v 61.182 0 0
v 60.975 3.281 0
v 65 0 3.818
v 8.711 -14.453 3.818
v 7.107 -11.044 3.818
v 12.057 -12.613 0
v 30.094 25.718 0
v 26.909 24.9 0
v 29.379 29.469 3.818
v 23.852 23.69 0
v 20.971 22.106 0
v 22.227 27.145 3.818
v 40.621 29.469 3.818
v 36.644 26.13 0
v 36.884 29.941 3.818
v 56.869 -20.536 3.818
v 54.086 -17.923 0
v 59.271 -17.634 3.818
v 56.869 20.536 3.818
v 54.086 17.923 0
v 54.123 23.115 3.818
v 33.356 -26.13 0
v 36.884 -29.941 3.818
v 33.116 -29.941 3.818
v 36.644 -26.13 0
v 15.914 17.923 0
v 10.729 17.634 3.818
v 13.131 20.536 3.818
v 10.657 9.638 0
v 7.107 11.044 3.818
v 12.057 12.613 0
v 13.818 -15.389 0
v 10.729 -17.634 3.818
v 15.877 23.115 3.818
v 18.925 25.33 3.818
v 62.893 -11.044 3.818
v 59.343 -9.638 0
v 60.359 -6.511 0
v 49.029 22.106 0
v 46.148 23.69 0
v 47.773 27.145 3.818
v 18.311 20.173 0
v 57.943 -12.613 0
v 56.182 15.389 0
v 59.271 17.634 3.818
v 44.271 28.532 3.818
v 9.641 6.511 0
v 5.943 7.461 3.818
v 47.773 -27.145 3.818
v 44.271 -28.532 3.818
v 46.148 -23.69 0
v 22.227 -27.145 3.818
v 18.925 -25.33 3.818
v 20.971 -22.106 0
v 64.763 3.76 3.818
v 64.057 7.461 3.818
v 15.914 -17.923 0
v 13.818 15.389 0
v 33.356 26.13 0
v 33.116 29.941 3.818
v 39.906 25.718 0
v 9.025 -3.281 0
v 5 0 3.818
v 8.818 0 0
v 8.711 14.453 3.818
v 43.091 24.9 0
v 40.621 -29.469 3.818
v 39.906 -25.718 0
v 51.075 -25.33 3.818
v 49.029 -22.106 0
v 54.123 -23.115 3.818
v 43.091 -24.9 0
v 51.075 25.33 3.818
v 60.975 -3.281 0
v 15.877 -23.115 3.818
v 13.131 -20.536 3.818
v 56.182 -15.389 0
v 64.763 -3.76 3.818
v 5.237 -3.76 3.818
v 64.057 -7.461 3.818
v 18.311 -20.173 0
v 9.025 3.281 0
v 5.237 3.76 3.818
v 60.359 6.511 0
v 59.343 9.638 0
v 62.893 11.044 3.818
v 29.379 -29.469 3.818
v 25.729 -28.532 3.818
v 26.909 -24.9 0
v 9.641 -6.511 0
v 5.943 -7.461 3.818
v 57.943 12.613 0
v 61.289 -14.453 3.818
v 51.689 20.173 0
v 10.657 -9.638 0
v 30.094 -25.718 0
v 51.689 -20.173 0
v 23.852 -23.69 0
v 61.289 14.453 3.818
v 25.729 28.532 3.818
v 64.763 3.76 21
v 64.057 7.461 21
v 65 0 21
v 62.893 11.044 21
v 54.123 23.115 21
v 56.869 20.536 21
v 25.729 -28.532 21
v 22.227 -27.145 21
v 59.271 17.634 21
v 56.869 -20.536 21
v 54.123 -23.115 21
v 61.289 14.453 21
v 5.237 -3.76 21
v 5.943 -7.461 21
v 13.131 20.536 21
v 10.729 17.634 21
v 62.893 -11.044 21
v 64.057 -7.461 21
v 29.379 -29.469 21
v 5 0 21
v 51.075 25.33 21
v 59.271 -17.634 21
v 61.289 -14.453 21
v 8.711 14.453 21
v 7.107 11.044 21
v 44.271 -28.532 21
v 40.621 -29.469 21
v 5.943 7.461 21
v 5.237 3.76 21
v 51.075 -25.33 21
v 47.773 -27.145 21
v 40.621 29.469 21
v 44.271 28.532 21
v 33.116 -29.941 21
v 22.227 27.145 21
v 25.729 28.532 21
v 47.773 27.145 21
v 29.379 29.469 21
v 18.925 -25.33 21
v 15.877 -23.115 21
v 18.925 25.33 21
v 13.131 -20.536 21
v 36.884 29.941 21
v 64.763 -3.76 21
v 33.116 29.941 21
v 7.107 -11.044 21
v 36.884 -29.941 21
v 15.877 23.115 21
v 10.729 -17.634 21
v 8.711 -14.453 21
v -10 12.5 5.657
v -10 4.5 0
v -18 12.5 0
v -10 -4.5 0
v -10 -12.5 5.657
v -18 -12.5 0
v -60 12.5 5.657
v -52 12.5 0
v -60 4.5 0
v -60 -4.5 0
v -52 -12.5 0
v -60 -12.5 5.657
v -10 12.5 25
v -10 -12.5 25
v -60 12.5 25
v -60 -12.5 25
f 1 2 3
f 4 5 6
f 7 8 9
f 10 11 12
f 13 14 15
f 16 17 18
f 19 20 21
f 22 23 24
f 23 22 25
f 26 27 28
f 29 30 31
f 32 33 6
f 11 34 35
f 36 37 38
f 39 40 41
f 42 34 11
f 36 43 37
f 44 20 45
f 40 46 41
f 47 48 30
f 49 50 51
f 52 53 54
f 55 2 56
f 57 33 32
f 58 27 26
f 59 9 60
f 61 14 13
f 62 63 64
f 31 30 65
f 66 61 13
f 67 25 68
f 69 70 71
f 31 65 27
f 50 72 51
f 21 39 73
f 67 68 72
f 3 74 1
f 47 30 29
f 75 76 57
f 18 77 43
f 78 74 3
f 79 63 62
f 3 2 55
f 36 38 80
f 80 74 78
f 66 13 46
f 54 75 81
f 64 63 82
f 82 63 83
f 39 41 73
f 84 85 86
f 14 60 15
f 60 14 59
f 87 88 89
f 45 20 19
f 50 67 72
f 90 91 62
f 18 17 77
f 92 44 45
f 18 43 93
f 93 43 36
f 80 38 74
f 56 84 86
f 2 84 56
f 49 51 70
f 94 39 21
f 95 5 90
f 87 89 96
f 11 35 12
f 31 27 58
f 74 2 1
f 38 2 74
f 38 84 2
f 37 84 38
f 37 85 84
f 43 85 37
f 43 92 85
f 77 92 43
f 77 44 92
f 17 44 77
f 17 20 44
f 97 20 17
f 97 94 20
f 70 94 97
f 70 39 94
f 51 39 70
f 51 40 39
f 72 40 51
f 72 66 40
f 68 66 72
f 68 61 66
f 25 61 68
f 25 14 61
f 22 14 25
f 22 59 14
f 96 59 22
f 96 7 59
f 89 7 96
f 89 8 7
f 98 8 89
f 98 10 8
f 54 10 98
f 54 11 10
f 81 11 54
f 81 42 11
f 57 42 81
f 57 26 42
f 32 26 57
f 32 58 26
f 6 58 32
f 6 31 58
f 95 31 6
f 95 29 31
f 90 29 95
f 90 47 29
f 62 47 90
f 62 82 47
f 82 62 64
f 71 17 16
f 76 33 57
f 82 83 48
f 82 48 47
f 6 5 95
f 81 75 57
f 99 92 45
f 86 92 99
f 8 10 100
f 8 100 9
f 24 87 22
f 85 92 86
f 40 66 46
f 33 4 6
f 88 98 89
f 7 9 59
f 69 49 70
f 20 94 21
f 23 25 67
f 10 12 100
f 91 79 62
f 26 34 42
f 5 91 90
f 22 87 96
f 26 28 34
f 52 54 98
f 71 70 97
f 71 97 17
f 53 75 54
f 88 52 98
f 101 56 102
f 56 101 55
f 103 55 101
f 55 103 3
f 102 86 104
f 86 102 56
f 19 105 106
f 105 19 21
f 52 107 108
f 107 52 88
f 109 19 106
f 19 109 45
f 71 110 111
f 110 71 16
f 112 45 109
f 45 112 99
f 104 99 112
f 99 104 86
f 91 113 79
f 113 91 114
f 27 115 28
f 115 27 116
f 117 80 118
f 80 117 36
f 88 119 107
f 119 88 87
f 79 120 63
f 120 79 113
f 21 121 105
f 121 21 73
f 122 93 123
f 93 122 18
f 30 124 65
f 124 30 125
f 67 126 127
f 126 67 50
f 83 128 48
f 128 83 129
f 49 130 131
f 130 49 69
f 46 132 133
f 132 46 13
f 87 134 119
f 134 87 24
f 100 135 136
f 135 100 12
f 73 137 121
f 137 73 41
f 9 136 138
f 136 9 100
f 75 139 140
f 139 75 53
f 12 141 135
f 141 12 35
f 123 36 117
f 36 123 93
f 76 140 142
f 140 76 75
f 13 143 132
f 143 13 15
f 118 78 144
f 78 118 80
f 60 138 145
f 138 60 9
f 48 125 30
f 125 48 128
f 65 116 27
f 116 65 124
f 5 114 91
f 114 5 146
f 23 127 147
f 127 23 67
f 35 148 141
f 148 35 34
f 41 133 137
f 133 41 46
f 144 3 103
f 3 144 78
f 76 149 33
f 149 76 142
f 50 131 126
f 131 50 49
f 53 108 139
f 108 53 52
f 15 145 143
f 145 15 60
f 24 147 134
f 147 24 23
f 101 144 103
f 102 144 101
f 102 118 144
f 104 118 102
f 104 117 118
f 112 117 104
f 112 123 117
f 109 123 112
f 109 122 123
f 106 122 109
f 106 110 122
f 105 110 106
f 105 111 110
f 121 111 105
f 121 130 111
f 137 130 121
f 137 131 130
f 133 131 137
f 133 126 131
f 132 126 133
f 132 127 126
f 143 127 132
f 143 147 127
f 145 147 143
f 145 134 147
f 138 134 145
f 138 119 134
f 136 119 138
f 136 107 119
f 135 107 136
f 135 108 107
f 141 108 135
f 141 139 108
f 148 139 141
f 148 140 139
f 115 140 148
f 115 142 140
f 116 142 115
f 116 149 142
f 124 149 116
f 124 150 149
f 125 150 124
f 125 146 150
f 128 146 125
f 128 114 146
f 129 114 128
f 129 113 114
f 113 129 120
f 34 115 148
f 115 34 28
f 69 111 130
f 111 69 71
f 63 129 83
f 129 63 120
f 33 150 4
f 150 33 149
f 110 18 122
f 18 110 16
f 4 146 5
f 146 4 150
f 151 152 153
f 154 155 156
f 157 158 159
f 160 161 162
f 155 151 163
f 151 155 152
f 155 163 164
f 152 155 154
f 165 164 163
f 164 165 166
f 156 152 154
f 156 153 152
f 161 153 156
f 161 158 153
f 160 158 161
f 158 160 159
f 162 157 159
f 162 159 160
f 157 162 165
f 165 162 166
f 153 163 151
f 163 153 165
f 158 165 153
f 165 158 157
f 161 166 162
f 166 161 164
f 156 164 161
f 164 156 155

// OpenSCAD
// file: ../utilities/transformations_oblomobka.scad
// Transformations
// (C) @oblomobka - 2014
// GPL3

// Transforma una forma en un sector según un ángulo dado.

module sector(	angle, 	// es el ángulo del sector, lo que quedará de la forma original
				d,		// valor auxiliar, será como mínimo igual al diámetro del cilindro que envuelve la forma original
				h		// valor auxiliar, será como mínimo igual a la altura del cilindro que envuelve la forma original
				){

POINTS=[	[0,0,-h],
		[0,0,h],
		[d*cos(0*angle/4),d*sin(0*angle/4),-h],
		[d*cos(0*angle/4),d*sin(0*angle/4),h],
		[d*cos(1*angle/4),d*sin(1*angle/4),-h],
		[d*cos(1*angle/4),d*sin(1*angle/4),h],
		[d*cos(2*angle/4),d*sin(2*angle/4),-h],
		[d*cos(2*angle/4),d*sin(2*angle/4),h],
		[d*cos(3*angle/4),d*sin(3*angle/4),-h],
		[d*cos(3*angle/4),d*sin(3*angle/4),h],
		[d*cos(4*angle/4),d*sin(4*angle/4),-h],
		[d*cos(4*angle/4),d*sin(4*angle/4),h],
		];

TRIANGLES=[	[0,1,2],
			[1,3,2],
			[2,3,4],
			[3,5,4],
			[4,5,6],
			[5,7,6],
			[6,7,8],
			[7,9,8],
			[8,9,10],
			[9,11,10],
			[10,11,0],
			[11,1,0],

			[5,3,1],
			[7,5,1],
			[9,7,1],
			[11,9,1],
			[0,2,4],
			[0,4,6],
			[0,6,8],
			[0,8,10]
			];

if(angle<=0 || angle>=360){
	child();
	}
	else{
		intersection(){
			polyhedron(points=POINTS,triangles=TRIANGLES);
			child();
			}
		}
}

//sector (150,40,10)cylinder(r=20,h=10); // Ejemplo de uso de la tansformación sector()
// file: ../utilities/functions_ext.scad
// Funciones sacadas de otras librerías y de diferentes autores

include <constants_oblomobka.scad>

/* A circular helix of radius a and pitch 2πb is described by the following parametrisation:
x(t) = a*cos(t),
y(t) = a*sin(t),
z(t) = b*t
Licensed under the MIT license.
© 2010 by Elmo Mäntynen
*/
function b(pitch) = pitch/(TAU);
function t(pitch, z) = z/b(pitch);
function helix_curve(pitch, radius, z) = [radius*cos(deg(t(pitch, z))), radius*sin(deg(t(pitch, z))), z];


/* Utility functions.
 * Originally by Hans Häggström, 2010.
 * Dual licenced under Creative Commons Attribution-Share Alike 3.0 and LGPL2 or later
 */
function distance(a, b) = sqrt( (a[0] - b[0])*(a[0] - b[0]) +
                                (a[1] - b[1])*(a[1] - b[1]) +
                                (a[2] - b[2])*(a[2] - b[2]) );

function length2(a) = sqrt( a[0]*a[0] + a[1]*a[1] );

function normalized(a) = a / (max(distance([0,0,0], a), 0.00001));

function normalized_axis(a) = 	a == "x" ? [1, 0, 0]:
                  			 	a == "y" ? [0, 1, 0]:
                   				a == "z" ? [0, 0, 1]: normalized(a);

function angleOfNormalizedVector(n) = [0, -atan2(n[2], length2([n[0], n[1]])), atan2(n[1], n[0]) ];

function angle(v) = angleOfNormalizedVector(normalized(v));

function angleBetweenTwoPoints(a, b) = angle(normalized(b-a));
// file: ../utilities/constants_oblomobka.scad
// números transcendentes

TAU = 2*PI; //6.2831853071 (PI ya está definido en Openscad)
EULER=2.71828282;


// números algebraicos

PHI=(1+sqrt(5))/2;


// Vectores

X = [1, 0, 0];
Y = [0, 1, 0];
Z = [0, 0, 1];
// file: ../utilities/shapes_oblomobka.scad
// Shapes
// (C) @oblomobka - 2014
// GPL3

include <constants_oblomobka.scad>
include <functions_oblomobka.scad>
include <functions_ext.scad>

use <transformations_oblomobka.scad>

// --- Piramide con base circunscrita en un círculo definido en las variables
module pyramid_circumscribed (	n=4,			// nº lados de la base de la pirámide	
								d1=20,		// diámetro del círculo-base donde se circunscribe la pirámide
								d2=0,		// diámetro del círculo-punta donde se circunscribe la pirámide
								h=10			// altura de la pirámide
								){

if(n%2==0){
	rotate([0,0,180/n])
		cylinder (r1=d1/2/cos(180/n), r2=d2/2/cos(180/n), h=h, $fn=n);
	}
	else{
		rotate([0,0,90/n])
			cylinder (r1=d1/2/cos(180/n), r2=d2/2/cos(180/n), h=h, $fn=n);
		}

}
// ------- pyramid_circumscribed (n=n,d1=d1,d2=d2,h=h); -----------------

// --- Prisma con base circunscrita en un círculo definido en las variables
module prism_circumscribed (	n=4,			// nº lados de la base del prisma
							d=20,		// diámetro del círculo donde se circunscribe el prisma
							h=10			// altura del prisma
							){
if(n%2==0){
	rotate([0,0,180/n])
		cylinder (r=d/2/cos(180/n), h=h, $fn=n);
	}
	else{
		rotate([0,0,90/n])
			cylinder (r=d/2/cos(180/n), h=h, $fn=n);
		}
}
// ------- prism_circumscribed (n=n,d=d,h=h); -----------------



// Toros

// Definido por el diámetro exterior y el diámetro del círculo en revolución
module torusOD (d1,d2,resolution){
$fn=resolution;	
rotate_extrude(){
	translate([d1/2-d2/2,0,0])
		circle(r=d2/2);
	}
}

// Definido por el diámetro exterior y el diámetro interior
module torusOI (d1,d2,resolution){
$fn=resolution;	
d=(d1-d2)/2;
rotate_extrude(){
	translate([d1/2-d/2,0,0])
		circle(r=d/2);
	}
}

// Definido por el diámetro de la línea neutra y el diámetro del círculo en revolución
module torusND (d1,d2,resolution){
$fn=resolution;	
rotate_extrude(){
	translate([d1/2,0,0])
		circle(r=d2/2);
	}
}

module torus_sector(d1,d2,angle=360,mode=1,extreme=true,resolution=32){

if(angle<=0 || angle>=360){
	if(mode==1){torusOD(d1,d2,resolution=resolution);}
	else{if(mode==2){torusND(d1,d2,resolution=resolution);}
	else{if(mode==3){torusOI(d1,d2,resolution=resolution);}}}
	}

else{
	if(mode==1){
		union(){
			sector(angle,d1,d2/2)torusOD(d1,d2,resolution=resolution);
			if(extreme==true){
				translate([d1/2-d2/2,0,0])sphere(d2/2,$fn=resolution);
				translate([(d1/2-d2/2)*cos(angle),(d1/2-d2/2)*sin(angle),0])sphere(d2/2,$fn=resolution);
				}
			}
		}
	else{
		if(mode==2){
			union(){
				sector(angle,d1+d2,d2/2)torusND(d1,d2,resolution=resolution);
				if(extreme==true){
					translate([d1/2,0,0])sphere(d2/2,$fn=resolution);
					translate([d1/2*cos(angle),d1/2*sin(angle),0])sphere(d2/2,$fn=resolution);
					}
				}
			}
		else{
			if(mode==3){
				union(){
					sector(angle,d1,(d1-d2)/4)torusOI(d1,d2,resolution=resolution);
					if(extreme==true){
						translate([d1/2-(d1-d2)/4,0,0])sphere((d1-d2)/4,$fn=resolution);
						translate([(d1/2-(d1-d2)/4)*cos(angle),(d1/2-(d1-d2)/4)*sin(angle),0])sphere((d1-d2)/4,$fn=resolution);
						}
					}
				}
			}
		}
	}
}


// Tubos

module tubeOT (d,t,h,resolution=resolution){	
	difference(){
		cylinder(r=d/2,h=h,$fn=resolution);
		cylinder(r=(d-2*t)/2,h=3*h,center=true,$fn=resolution);
		}
}

// Definido por el diámetro exterior y el diámetro interior
module tubeOI (d1,d2,h,resolution=resolution){
	difference(){
		cylinder(r=d1/2,h=h,$fn=resolution);
		cylinder(r=d2/2,h=3*h,center=true,$fn=resolution);	
		}
}

// Definido por el diámetro de la línea neutra y el diámetro del círculo en revolución
module tubeNT (d,t,h,resolution=resolution){
	difference(){
		cylinder(r=(d+t)/2,h=h,$fn=resolution);
		cylinder(r=(d-t)/2,h=3*h,center=true,$fn=resolution);
	}
}

module tube_sector(d=25,t=2,h=1,angle=360,mode=1,extreme=true,resolution=32){

if(angle<=0 || angle>=360){
	if(mode==1){tubeOT(d,t,h,resolution=resolution);}
	else{if(mode==2){tubeNT(d,t,h,resolution=resolution);}
	else{if(mode==3){tubeOI(d,t,h,resolution=resolution);}}}
	}

else{
	if(mode==1){
		union(){
			sector(angle,d,h)tubeOT(d,t,h,resolution=resolution);
			if(extreme==true){
				translate([d/2-t/2,0,0])cylinder(r=t/2,h=h,$fn=resolution);
				translate([(d/2-t/2)*cos(angle),(d/2-t/2)*sin(angle),0])cylinder(r=t/2,h=h,$fn=resolution);;
				}
			}
		}
	else{
		if(mode==2){
			union(){
				sector(angle,d+t,h)tubeNT(d,t,h,resolution=resolution);
				if(extreme==true){
					translate([d/2,0,0])cylinder(r=t/2,h=h,$fn=resolution);
					translate([d/2*cos(angle),d/2*sin(angle),0])cylinder(r=t/2,h=h,$fn=resolution);
					}
				}
			}
		else{
			if(mode==3){
				union(){
					sector(angle,d,h)tubeOI(d,t,h,resolution=resolution);
					if(extreme==true){
						translate([d/2-(d-t)/4,0,0])cylinder(r=(d-t)/4,h=h,$fn=resolution);
						translate([(d/2-(d-t)/4)*cos(angle),(d/2-(d-t)/4)*sin(angle),0])cylinder(r=(d-t)/4,h=h,$fn=resolution);
						}
					}
				}
			}
		}
	}
}

//torus_sector(d1=15,d2=4,angle=215,mode=3,extreme=true,resolution=50);
//tube_sector(d=24,t=11,h=15,angle=250,mode=1,extreme=true,resolution=50);

pyramid_circumscribed(n=10,d=8,h=4);
// file: ../utilities/functions_oblomobka.scad
// Functions
// (C) @oblomobka - 2014
// GPL3

include <constants_oblomobka.scad>

// da el diámetro interior del cono(d1,d2,h) a una altura interior(hi) conocida
function di_cone(d1,d2,h,hi)=d2+(d1-d2)*(1-hi/h);

// da la altura interior del cono(d1,d2,h) a un diametro(di) conocido
function hi_cone(d1,d2,h,di)=-h*((di-d2)/(d1-d2)-1);

// 
function r_circle_intersection (d1,d2)=sqrt(pow(d1/2,2)-pow(d2/2,2));

// Relaciones entre radio, apotema y lado en un polígono de n lados
function side_apothem (apothem,n)=apothem*2*tan(180/n);
function apothem_radius(radius,n)=radius*cos(180/n);
function radius_apothem(apothem,n)=apothem/cos(180/n);
function side_radius (radius,n)=radius*2*sin(180/n);

// limita los posibles valores de x, que siempre estarán comprendidos entre un minimo(a) y un maximo(z)
function lim(a,x,z)=max(a,min(x,z));

// transforma angulo, radianes --> hexadecimal
function deg(angle) = 180*angle/PI;
// transforma angulo, hexadecimal --> radianes
function rad(angle) = angle*PI/180;
// file: ../utilities/limits_oblobots.scad
//PIN
	d_pin_minmax=[10,30];			//	d_pin=lim(d_pin_minmax[0],pin[0],d_pin_minmax[1]);			
	h_pin_minmax=[0,10];			//	h_pin=lim(h_pin_minmax[0],pin[1],h_pin_minmax[1]);

//LEGS & FOOTS
	d_leg_minmax=[10,30];			//	d_leg=lim(d_leg_minmax[0],leg[0],d_leg_minmax[1]);
	h_leg_minmax=[20,90];			//	h_leg=lim(h_leg_minmax[0],leg[1],h_leg_minmax[1]);	
	n_leg_minmax=[4,16];			//	n_leg=lim(n_leg_minmax[0],leg[2],n_leg_minmax[1]);
	legsposition_minmax=[0,100];	// 	legsposition=lim(legsposition_minmax[0],leg[1],legsposition_minmax[1]);

	l_foot_minmax=[24,70];		//	l_foot=lim(l_foot_minmax[0],foot[0],l_foot_minmax[1]);
	h_foot_minmax=[0,40];			//	h_foot=lim(h_foot_minmax[0],foot[1],h_foot_minmax[1]);

//HIP | WAIST
	//C
	d_hip_minmax=[25,80];			//	d_hip=lim(d_hip_minmax[0],hip[0],d_hip_minmax[1]);
	h_hip_minmax=[10,70];			//	h_hip=lim(h_pin+2,hip[1],h_hip_minmax[1]);
	f_hip_minmax=[0,100];			//	f_hip=lim(f_hip_minmax[0],hip[2],f_hip_minmax[1]);

								//	d1_waist=lim(d_pin,waist[0],d_hip);
								//	d2_waist=lim(d_pin,waist[1],d1_waist);
	h_waist_minmax=[0.3,20];		//	h_waist=lim(h_waist_minmax[0],waist[2],h_waist_minmax[1]);

	
	//Q
	x_hip_minmax=[20,90];			//	x_hip=lim(x_hip_minmax[0],hip[0],x_hip_minmax[1]);
	y_hip_minmax=[20,60];			//	y_hip=lim(y_hip_minmax[0],hip[1],y_hip_minmax[1]);
	z_hip_minmax=[10,60];			//	z_hip=lim(z_hip_minmax[0],hip[2],z_hip_minmax[1]);
	bevel_hip_minmax=[0.5,20];	//	bevel_hip=lim(bevel_hip_minmax[0],hip[3],bevel_hip_minmax[1]);

	n_waist_minmax=[4,50];		//	n_waist=lim(n_waist_minmax[0],waist[3],n_waist_minmax[1]);
								//	d1_waist=lim(d_pin,waist[0],min(x_hip,y_hip));
								//	d2_waist=lim(d_pin,waist[1],d1_waist);


//TRUNK | SHOULDER | NECK
	//C
	d1_trunk_minmax=[30,100];		//	d1_trunk=lim(d1_trunk_minmax[0],trunk[0],d1_trunk_minmax[1]); 
	d2_trunk_minmax=[30,100];		//	d2_trunk=lim(d2_trunk_minmax[0],trunk[1],d1_trunk);
	h_trunk_minmax=[24,100];		//	h_trunk=lim(h_trunk_minmax[0],trunk[2],h_trunk_minmax[1]);

	d1_shoulder_minmax=[12,50];	//	d1_shoulder=lim(d1_shoulder_minmax[0],shoulder[0],h_trunk*sin(angle_trunk));
	d_aux_shoulder_minmax=[0,10];	//	d_aux_shoulder=lim(d_aux_shoulder_minmax[0],shoulder[1],d_aux_shoulder_minmax[1]);
	h_shoulder_minmax=[0,50];		//	h_shoulder=lim(h_shoulder_minmax[0],shoulder[2],d2_trunk/2);

								//	d1_neck=lim(d_pin+2,neck[0],d2_trunk);
								//	d2_neck=lim(d_pin+2,neck[1],d1_neck);
	h_neck_minmax=[0.3,20];		//	h_neck=lim(h_neck_minmax[0],neck[2],h_neck_minmax[1]);

	//Q
	x_trunk_minmax=[20,90];		//	x_trunk=lim(x_trunk_minmax[0],trunk[0],x_trunk_minmax[1]);
	y_trunk_minmax=[20,90];		//	y_trunk=lim(d_pin+1+x_trunk/5,trunk[1],y_trunk_minmax[1]);
	z_trunk_minmax=[26,90];		//	z_trunk=lim(z_trunk_minmax[0],trunk[2],z_trunk_minmax[1]);
	
	n_neck_minmax=[4,50];			//	n_neck=lim(n_neck_minmax[0],neck[3],n_neck_minmax[1]);
								//	d1_neck=lim(d_pin+2,neck[0],min(x_trunk,y_trunk));	
								//	d2_neck=lim(d_pin+2,neck[1],d1_neck);

	//ELECTRIC TRUNK
	d_polygonal_trunk_minmax=[45,80];	//d_polygonal_trunk=lim(d_polygonal_trunk_minmax[0],trunk[0],d_polygonal_trunk_minmax[1]);							
	h_polygonal_trunk_minmax=[87,120];	//h_polygonal_trunk=lim(h_polygonal_trunk_minmax[0],trunk[1],h_polygonal_trunk_minmax[1]);
	thickness_trunk_minmax=[1,6];	//thickness_trunk=lim(thickness_trunk_minmax[0],trunk[2],thickness_trunk_minmax[1]);

// ARMS | HANDS
	// C
	d_arm_minmax=[10,40];			// 	d_arm=lim(d_arm_minmax[0],arm[0],d_arm_minmax[1]);
								//	d_arm=lim(d_pin+1,arm[0],d_arm_minmax[1]);	
	h_arm_minmax=[5,25];			// 	h_arm=lim(h_arm_minmax[0],arm[1],h_arm_minmax[1]);
	armpit_minmax=[0.3,60];		//	armpit=lim(armpit_minmax[0],arm[2],armpit_minmax[1]);
	l_arm_minmax=[20,120];		// 	l_arm=lim(d_arm+d_hand,arm[2],l_arm_minmax[1]);	

	d_hand_minmax=[10,60];		//	d_hand=lim(d_hand_minmax[0],hand[0],d_hand_minmax[1]);
	h_hand_minmax=[3,25];			//	h_hand=lim(h_hand_minmax[0],hand[1],h_arm-0.5);
	angle_hand_minmax=[0,180];	//	angle_hand=lim(angle_hand_minmax[0],hand[2]/2,angle_hand_minmax[1]);

	// Q
	x_arm_minmax=[5,25];			// 	x_arm=lim(x_arm_minmax[0],arm[1],x_arm_minmax[1]);
	y_arm_minmax=[10,40];			// 	y_arm=lim(y_arm_minmax[0],arm[0],y_arm_minmax[1]);
	z_arm_minmax=[20,120];		//	z_arm=lim(y_arm+5+d_hand,arm[2],z_arm_minmax[1]);

	n_hand_minmax=[4,12];			// 	n_hand=lim(n_hand_minmax[0],2*floor(hand[2]/2),n_hand_minmax[1]);
								//	h_hand=lim(h_hand_minmax[0],hand[1],x_arm-0.5);

// HEAD | EYES | BRAIN
	// C
	h_head_minmax=[20,100];		// 	h_head=lim(h_head_minmax[0],head[2],h_head_minmax[1]);
	d1_head_minmax=[20,60];		// 	d1_head=lim(h_head_minmax[0],head[0],h_head_minmax[1]);
	d2_head_minmax=[15,150];		// 	d2_head=lim(h_head_minmax[0],head[1],2*h_head+d1_head);

	// Q
	x_head_minmax=[20,100];		// x_head=lim(x_head_minmax[0],head[0],x_head_minmax[1]);
	y_head_minmax=[20,100];		// y_head=lim(y_head_minmax[0],head[1],y_head_minmax[1]);
	z_head_minmax=[20,100];		// z_head=lim(z_head_minmax[0],head[2],z_head_minmax[1]);

	d_eye_minmax=[5,40];			// 	d_eye=lim(d_eye_minmax[0],eye[0],(d1_head+d2_head)/2);
	h_eye_minmax=[1,10];			// 	h_eye=lim(h_eye_minmax[0],eye[1],h_eye_minmax[1]);
	edge_eye_minmax=[1,12];		//	edge_eye=lim(edge_eye_minmax[0],eye[2],d_eye/2-3);

	frown_eye_expression_minmax=[0,100];		// frown_eye_expression=lim(frown_eye_expression_minmax[0],eye_expression[1],frown_eye_expression_minmax[1]);
	bridge_eye_position_minmax=[0,100];		// bridge_eye_position=lim(bridge_eye_position_minmax[0],eye_position[0],bridge_eye_position_minmax[1]);	
	f_h_eye_position_minmax=[0,100];			// f_h_eye_position=lim(f_h_eye_position_minmax[0],eye_position[1],f_h_eye_position_minmax[1]);	

	h_brain_minmax=[0,40];			//	h_brain=lim(h_brain_minmax[0],brain[0],h_brain_minmax[1]);
	edge_brain_minmax=[0,25];			//	edge_brain=lim(edge_brain_minmax[0],brain[1],edge_brain_minmax[1]);

//BADGE
	d_badge_minmax=[20,40];		//	d_badge=lim(d_badge_minmax[0],badge[0],d_badge_minmax[1])
	h_badge_minmax=[0.5,5];		// 	h_badge=lim(h_badge_minmax[0],badge[1],h_badge_minmax[1]);
	n_badge_minmax=[4,50];		// 	n_badge=lim(n_badge_minmax[0],badge[3],n_badge_minmax[1]);
	edge_badge_minmax=[1,5];		//	edge_badge=lim(edge_badge_minmax[0],badge[2],edge_badge_minmax[1]);
// file: ../utilities/presets_oblobots.scad
//////////////////////////////////////////////////////////////////////////////////////////////////
// presets [OBLOBOTS] 
// valores predeterminados para los volúmenes de un oblobot así como de los modos de represntación
//////////////////////////////////////////////////////////////////////////////////////////////////
// (c) Jorge Medal (@oblomobka) - Sara Alvarellos (@trecedejunio) Oct 2013
//////////////////////////////////////////////////////////////////////////////////////////////////
// GPL license
//////////////////////////////////////////////////////////////////////////////////////////////////

use <functions_oblomobka.scad>


//-- CARACTERÍSTICAS DEL PIN

SIMPLE=[0,0,0];					// cilindro 

	// Pestañas en pin con punta expandible
	tab_expansion=80;
	TABWIDE=[35,35,tab_expansion];
	TABNORMAL=[50,50,tab_expansion];
	TABFINE=[65,65,tab_expansion];

/////////////////////////////////////////////
/////// REPRESENTACIÓN //////////////////////
/////////////////////////////////////////////

//-- MODOS DE REPRESENTACIÓN DE LAS PARTES 

ASSEMBLED=[0,1,0,0];
EXPLOSION=[0,1,1,1];
PRINTING=[1,0,0,2];


//-- ELECCIÓN DE LA PARTE REPRESENTADA	

ALL=[0];
LEGS=[1];
HIP=[2];
TRUNK=[3];
HEAD=[4];
ARMS=[5];
BADGES=[6];

//-- COLORES

arms_color=[1,rands(100,200,1)[0]/255,0];
legs_color=[0,rands(100,200,1)[0]/255,1];
trunk_color=[rands(0,100,1)[0]/255,rands(150,225,1)[0]/255,rands(0,100,1)[0]/255];
head_color=[220/255,rands(0,100,1)[0]/255,20/255];
badges_color=[rands(0,255,1)[0]/255,rands(0,255,1)[0]/255,rands(0,255,1)[0]/255];
hip_color=[0,(rands(100,200,1)[0])/255,1];
// file: ../utilities/external_elements_oblobots.scad
//////////////////////////////////////////////////////////////////////////////////////////////////
// external elements [OBLOBOTS] 
// librería de elementos externos comerciales (botones automáticos, espigas de madera baterías, ...) 
// que se usan en las partes de los oblobots
//////////////////////////////////////////////////////////////////////////////////////////////////
// (c) Jorge Medal (@oblomobka) - Sara Alvarellos (@trecedejunio) 2014-02
//////////////////////////////////////////////////////////////////////////////////////////////////
// GPL license
//////////////////////////////////////////////////////////////////////////////////////////////////

//-- BOTONES AUTOMÁTICOS - Press Fastener (PF)
//-- Cada código corresponde a las medidas de un modelo concreto

//XXX= [ xx,xx,xx,xx,xx,xx,xx ];		// [ 	diametro hembra,
									//		espesor hembra,
									//		diámetro alojamiento en hembra (aparece en los botones para coser),
									//		saliente del alojamiento en hembra (aparece en los botones para coser),
									//		diámetro macho,
									//		espesor macho	
									//		tipo]

NULL=[0,0,0,0,0,0,0];				// no hay botón automático 
//PON = [11.7,2.35,0,0,11.7,1.6 ];	// marca desconocida, encontrado en Pontejos (Madrid)
//PRYM10 = [11,2.2,0,0,11,2.0];		// marca PRYM - 10 mm
PRYM_SNAP_FASTENERS_11 = [10.1,1.4,3.5,3,9.1,1,2];	// marca PRYM - Snap fasteners 11mm
PRYM_SNAP_FASTENERS_9 = [8.5,1.5,3,2.7,8.1,1,2];	// marca PRYM - Snap fasteners 9mm

fit_male=0.7;

//-- Espigas de madera - DOWEL

DOWEL_8=[8,40,0,0,0,0,1];
DOWEL_6=[6,30,0,0,0,0,1];

//-- TUBOS DE PLÁSTICO

PIPE_6=[6,20,0,0,0,0,1];



//-- BATERÍAS CILÍNDRICAS

//XX= [ xx,xx ];		// [ 	diametro de la pila,
					//		longitud	de la pila	]

AA = [ 14.5, 50.5 ];
AAA = [ 10.5,44.5 ];
C = [ 26.2, 50 ];
D = [ 34.2, 61.5 ]; 
// main file
//////////////////////////////////////////////////////////////////////////////////////////////////
// HIP[OBLOBOTS] 
// preform
//////////////////////////////////////////////////////////////////////////////////////////////////
// (c) Jorge Medal (@oblomobka) - Sara Alvarellos (@trecedejunio) 2014-04 v.10
//////////////////////////////////////////////////////////////////////////////////////////////////
// GPL license
//////////////////////////////////////////////////////////////////////////////////////////////////

include <../utilities/external_elements_oblobots.scad>
include <../utilities/presets_oblobots.scad>
include <../utilities/limits_oblobots.scad>

use <../utilities/functions_oblomobka.scad>
use <../utilities/shapes_oblomobka.scad>


//////////////////////////////////////////////////////////////////
/////////////////// MODULO hip_cylindrical  //////////////////////

module hip_cylindrical(hip=[40,15,80]){	// [ d,h,f ] Medidas de la cadera

// valores con límites: acotados entre un máximo y un mínimo (los valores límite están en <limits_oblobots.scad>)
d_hip=lim(d_hip_minmax[0],hip[0],d_hip_minmax[1]);
h_hip=lim(h_hip_minmax[0],hip[1],h_hip_minmax[1]);
f_hip=lim(f_hip_minmax[0],hip[2],f_hip_minmax[1]);

// variables condicionadas a los valores de entrada
h1_hip=h_hip-f_hip*h_hip/110;
h2_hip=h_hip-h1_hip;

d1_hip=max(3*d_hip/4,(d_hip-2*h1_hip));  // diámetro inferior de la cadera

$fn=50;

// --------- Volumen ----------------

union(){
	cylinder(r1=d1_hip/2,r2=d_hip/2,h=h1_hip);
	translate([0,0,h1_hip])
		cylinder (r=d_hip/2,h=h2_hip);	
	}
}
// -------------- Fin del módulo hip_cylindrical() ------------------------
// ------------------------------------------------------------------------


//////////////////////////////////////////////////////////////////
/////////////////// MÓDULO hip_quadrangle()  /////////////////////

module hip_quadrangle (hip=[40,22,18,3]){			// [ ancho(x), fondo(y), altura(z), chaflán ] Medida de la cadera


x_hip=lim(x_hip_minmax[0],hip[0],x_hip_minmax[1]);			// medida de la cadera: ancho
y_hip=lim(y_hip_minmax[0],hip[1],y_hip_minmax[1]);			// medida de la cadera: fondo
z_hip=lim(z_hip_minmax[0],hip[2],z_hip_minmax[1]);			// medida de la cadera: alto
bevel_hip=lim(bevel_hip_minmax[0],hip[3],bevel_hip_minmax[1]);;		// medida de la cadera: chaflán

// Volumen
difference(){
	translate([0,0,z_hip/2])
		cube ([x_hip,y_hip,z_hip],center=true);
	for(i=[	[1,1,0],
			[1,-1,-90],
			[-1,1,90],
			[-1,-1,180]]){
		translate([i[0]*x_hip,i[1]*y_hip,0]/2)
			rotate([0,0,i[2]])rotate(45*[0,1,1])
				cube([min(2*bevel_hip,((y_hip-1)/2)),x_hip,x_hip],center=true);
		}
	}
}
// ------------ Fin del módulo hip_quadrangle(hip[x,y,z,b]) -------------
// ----------------------------------------------------------------------


/////////////////////////////////////////////////////////////////////////
/////////////////// Ejemplos de aplicación //////////////////////////////

i=35;

translate([i,0,0])
	hip_cylindrical(hip=[60,21,90]);

translate([-i,0,0])
	hip_quadrangle(hip=[50,25,25,4]);
